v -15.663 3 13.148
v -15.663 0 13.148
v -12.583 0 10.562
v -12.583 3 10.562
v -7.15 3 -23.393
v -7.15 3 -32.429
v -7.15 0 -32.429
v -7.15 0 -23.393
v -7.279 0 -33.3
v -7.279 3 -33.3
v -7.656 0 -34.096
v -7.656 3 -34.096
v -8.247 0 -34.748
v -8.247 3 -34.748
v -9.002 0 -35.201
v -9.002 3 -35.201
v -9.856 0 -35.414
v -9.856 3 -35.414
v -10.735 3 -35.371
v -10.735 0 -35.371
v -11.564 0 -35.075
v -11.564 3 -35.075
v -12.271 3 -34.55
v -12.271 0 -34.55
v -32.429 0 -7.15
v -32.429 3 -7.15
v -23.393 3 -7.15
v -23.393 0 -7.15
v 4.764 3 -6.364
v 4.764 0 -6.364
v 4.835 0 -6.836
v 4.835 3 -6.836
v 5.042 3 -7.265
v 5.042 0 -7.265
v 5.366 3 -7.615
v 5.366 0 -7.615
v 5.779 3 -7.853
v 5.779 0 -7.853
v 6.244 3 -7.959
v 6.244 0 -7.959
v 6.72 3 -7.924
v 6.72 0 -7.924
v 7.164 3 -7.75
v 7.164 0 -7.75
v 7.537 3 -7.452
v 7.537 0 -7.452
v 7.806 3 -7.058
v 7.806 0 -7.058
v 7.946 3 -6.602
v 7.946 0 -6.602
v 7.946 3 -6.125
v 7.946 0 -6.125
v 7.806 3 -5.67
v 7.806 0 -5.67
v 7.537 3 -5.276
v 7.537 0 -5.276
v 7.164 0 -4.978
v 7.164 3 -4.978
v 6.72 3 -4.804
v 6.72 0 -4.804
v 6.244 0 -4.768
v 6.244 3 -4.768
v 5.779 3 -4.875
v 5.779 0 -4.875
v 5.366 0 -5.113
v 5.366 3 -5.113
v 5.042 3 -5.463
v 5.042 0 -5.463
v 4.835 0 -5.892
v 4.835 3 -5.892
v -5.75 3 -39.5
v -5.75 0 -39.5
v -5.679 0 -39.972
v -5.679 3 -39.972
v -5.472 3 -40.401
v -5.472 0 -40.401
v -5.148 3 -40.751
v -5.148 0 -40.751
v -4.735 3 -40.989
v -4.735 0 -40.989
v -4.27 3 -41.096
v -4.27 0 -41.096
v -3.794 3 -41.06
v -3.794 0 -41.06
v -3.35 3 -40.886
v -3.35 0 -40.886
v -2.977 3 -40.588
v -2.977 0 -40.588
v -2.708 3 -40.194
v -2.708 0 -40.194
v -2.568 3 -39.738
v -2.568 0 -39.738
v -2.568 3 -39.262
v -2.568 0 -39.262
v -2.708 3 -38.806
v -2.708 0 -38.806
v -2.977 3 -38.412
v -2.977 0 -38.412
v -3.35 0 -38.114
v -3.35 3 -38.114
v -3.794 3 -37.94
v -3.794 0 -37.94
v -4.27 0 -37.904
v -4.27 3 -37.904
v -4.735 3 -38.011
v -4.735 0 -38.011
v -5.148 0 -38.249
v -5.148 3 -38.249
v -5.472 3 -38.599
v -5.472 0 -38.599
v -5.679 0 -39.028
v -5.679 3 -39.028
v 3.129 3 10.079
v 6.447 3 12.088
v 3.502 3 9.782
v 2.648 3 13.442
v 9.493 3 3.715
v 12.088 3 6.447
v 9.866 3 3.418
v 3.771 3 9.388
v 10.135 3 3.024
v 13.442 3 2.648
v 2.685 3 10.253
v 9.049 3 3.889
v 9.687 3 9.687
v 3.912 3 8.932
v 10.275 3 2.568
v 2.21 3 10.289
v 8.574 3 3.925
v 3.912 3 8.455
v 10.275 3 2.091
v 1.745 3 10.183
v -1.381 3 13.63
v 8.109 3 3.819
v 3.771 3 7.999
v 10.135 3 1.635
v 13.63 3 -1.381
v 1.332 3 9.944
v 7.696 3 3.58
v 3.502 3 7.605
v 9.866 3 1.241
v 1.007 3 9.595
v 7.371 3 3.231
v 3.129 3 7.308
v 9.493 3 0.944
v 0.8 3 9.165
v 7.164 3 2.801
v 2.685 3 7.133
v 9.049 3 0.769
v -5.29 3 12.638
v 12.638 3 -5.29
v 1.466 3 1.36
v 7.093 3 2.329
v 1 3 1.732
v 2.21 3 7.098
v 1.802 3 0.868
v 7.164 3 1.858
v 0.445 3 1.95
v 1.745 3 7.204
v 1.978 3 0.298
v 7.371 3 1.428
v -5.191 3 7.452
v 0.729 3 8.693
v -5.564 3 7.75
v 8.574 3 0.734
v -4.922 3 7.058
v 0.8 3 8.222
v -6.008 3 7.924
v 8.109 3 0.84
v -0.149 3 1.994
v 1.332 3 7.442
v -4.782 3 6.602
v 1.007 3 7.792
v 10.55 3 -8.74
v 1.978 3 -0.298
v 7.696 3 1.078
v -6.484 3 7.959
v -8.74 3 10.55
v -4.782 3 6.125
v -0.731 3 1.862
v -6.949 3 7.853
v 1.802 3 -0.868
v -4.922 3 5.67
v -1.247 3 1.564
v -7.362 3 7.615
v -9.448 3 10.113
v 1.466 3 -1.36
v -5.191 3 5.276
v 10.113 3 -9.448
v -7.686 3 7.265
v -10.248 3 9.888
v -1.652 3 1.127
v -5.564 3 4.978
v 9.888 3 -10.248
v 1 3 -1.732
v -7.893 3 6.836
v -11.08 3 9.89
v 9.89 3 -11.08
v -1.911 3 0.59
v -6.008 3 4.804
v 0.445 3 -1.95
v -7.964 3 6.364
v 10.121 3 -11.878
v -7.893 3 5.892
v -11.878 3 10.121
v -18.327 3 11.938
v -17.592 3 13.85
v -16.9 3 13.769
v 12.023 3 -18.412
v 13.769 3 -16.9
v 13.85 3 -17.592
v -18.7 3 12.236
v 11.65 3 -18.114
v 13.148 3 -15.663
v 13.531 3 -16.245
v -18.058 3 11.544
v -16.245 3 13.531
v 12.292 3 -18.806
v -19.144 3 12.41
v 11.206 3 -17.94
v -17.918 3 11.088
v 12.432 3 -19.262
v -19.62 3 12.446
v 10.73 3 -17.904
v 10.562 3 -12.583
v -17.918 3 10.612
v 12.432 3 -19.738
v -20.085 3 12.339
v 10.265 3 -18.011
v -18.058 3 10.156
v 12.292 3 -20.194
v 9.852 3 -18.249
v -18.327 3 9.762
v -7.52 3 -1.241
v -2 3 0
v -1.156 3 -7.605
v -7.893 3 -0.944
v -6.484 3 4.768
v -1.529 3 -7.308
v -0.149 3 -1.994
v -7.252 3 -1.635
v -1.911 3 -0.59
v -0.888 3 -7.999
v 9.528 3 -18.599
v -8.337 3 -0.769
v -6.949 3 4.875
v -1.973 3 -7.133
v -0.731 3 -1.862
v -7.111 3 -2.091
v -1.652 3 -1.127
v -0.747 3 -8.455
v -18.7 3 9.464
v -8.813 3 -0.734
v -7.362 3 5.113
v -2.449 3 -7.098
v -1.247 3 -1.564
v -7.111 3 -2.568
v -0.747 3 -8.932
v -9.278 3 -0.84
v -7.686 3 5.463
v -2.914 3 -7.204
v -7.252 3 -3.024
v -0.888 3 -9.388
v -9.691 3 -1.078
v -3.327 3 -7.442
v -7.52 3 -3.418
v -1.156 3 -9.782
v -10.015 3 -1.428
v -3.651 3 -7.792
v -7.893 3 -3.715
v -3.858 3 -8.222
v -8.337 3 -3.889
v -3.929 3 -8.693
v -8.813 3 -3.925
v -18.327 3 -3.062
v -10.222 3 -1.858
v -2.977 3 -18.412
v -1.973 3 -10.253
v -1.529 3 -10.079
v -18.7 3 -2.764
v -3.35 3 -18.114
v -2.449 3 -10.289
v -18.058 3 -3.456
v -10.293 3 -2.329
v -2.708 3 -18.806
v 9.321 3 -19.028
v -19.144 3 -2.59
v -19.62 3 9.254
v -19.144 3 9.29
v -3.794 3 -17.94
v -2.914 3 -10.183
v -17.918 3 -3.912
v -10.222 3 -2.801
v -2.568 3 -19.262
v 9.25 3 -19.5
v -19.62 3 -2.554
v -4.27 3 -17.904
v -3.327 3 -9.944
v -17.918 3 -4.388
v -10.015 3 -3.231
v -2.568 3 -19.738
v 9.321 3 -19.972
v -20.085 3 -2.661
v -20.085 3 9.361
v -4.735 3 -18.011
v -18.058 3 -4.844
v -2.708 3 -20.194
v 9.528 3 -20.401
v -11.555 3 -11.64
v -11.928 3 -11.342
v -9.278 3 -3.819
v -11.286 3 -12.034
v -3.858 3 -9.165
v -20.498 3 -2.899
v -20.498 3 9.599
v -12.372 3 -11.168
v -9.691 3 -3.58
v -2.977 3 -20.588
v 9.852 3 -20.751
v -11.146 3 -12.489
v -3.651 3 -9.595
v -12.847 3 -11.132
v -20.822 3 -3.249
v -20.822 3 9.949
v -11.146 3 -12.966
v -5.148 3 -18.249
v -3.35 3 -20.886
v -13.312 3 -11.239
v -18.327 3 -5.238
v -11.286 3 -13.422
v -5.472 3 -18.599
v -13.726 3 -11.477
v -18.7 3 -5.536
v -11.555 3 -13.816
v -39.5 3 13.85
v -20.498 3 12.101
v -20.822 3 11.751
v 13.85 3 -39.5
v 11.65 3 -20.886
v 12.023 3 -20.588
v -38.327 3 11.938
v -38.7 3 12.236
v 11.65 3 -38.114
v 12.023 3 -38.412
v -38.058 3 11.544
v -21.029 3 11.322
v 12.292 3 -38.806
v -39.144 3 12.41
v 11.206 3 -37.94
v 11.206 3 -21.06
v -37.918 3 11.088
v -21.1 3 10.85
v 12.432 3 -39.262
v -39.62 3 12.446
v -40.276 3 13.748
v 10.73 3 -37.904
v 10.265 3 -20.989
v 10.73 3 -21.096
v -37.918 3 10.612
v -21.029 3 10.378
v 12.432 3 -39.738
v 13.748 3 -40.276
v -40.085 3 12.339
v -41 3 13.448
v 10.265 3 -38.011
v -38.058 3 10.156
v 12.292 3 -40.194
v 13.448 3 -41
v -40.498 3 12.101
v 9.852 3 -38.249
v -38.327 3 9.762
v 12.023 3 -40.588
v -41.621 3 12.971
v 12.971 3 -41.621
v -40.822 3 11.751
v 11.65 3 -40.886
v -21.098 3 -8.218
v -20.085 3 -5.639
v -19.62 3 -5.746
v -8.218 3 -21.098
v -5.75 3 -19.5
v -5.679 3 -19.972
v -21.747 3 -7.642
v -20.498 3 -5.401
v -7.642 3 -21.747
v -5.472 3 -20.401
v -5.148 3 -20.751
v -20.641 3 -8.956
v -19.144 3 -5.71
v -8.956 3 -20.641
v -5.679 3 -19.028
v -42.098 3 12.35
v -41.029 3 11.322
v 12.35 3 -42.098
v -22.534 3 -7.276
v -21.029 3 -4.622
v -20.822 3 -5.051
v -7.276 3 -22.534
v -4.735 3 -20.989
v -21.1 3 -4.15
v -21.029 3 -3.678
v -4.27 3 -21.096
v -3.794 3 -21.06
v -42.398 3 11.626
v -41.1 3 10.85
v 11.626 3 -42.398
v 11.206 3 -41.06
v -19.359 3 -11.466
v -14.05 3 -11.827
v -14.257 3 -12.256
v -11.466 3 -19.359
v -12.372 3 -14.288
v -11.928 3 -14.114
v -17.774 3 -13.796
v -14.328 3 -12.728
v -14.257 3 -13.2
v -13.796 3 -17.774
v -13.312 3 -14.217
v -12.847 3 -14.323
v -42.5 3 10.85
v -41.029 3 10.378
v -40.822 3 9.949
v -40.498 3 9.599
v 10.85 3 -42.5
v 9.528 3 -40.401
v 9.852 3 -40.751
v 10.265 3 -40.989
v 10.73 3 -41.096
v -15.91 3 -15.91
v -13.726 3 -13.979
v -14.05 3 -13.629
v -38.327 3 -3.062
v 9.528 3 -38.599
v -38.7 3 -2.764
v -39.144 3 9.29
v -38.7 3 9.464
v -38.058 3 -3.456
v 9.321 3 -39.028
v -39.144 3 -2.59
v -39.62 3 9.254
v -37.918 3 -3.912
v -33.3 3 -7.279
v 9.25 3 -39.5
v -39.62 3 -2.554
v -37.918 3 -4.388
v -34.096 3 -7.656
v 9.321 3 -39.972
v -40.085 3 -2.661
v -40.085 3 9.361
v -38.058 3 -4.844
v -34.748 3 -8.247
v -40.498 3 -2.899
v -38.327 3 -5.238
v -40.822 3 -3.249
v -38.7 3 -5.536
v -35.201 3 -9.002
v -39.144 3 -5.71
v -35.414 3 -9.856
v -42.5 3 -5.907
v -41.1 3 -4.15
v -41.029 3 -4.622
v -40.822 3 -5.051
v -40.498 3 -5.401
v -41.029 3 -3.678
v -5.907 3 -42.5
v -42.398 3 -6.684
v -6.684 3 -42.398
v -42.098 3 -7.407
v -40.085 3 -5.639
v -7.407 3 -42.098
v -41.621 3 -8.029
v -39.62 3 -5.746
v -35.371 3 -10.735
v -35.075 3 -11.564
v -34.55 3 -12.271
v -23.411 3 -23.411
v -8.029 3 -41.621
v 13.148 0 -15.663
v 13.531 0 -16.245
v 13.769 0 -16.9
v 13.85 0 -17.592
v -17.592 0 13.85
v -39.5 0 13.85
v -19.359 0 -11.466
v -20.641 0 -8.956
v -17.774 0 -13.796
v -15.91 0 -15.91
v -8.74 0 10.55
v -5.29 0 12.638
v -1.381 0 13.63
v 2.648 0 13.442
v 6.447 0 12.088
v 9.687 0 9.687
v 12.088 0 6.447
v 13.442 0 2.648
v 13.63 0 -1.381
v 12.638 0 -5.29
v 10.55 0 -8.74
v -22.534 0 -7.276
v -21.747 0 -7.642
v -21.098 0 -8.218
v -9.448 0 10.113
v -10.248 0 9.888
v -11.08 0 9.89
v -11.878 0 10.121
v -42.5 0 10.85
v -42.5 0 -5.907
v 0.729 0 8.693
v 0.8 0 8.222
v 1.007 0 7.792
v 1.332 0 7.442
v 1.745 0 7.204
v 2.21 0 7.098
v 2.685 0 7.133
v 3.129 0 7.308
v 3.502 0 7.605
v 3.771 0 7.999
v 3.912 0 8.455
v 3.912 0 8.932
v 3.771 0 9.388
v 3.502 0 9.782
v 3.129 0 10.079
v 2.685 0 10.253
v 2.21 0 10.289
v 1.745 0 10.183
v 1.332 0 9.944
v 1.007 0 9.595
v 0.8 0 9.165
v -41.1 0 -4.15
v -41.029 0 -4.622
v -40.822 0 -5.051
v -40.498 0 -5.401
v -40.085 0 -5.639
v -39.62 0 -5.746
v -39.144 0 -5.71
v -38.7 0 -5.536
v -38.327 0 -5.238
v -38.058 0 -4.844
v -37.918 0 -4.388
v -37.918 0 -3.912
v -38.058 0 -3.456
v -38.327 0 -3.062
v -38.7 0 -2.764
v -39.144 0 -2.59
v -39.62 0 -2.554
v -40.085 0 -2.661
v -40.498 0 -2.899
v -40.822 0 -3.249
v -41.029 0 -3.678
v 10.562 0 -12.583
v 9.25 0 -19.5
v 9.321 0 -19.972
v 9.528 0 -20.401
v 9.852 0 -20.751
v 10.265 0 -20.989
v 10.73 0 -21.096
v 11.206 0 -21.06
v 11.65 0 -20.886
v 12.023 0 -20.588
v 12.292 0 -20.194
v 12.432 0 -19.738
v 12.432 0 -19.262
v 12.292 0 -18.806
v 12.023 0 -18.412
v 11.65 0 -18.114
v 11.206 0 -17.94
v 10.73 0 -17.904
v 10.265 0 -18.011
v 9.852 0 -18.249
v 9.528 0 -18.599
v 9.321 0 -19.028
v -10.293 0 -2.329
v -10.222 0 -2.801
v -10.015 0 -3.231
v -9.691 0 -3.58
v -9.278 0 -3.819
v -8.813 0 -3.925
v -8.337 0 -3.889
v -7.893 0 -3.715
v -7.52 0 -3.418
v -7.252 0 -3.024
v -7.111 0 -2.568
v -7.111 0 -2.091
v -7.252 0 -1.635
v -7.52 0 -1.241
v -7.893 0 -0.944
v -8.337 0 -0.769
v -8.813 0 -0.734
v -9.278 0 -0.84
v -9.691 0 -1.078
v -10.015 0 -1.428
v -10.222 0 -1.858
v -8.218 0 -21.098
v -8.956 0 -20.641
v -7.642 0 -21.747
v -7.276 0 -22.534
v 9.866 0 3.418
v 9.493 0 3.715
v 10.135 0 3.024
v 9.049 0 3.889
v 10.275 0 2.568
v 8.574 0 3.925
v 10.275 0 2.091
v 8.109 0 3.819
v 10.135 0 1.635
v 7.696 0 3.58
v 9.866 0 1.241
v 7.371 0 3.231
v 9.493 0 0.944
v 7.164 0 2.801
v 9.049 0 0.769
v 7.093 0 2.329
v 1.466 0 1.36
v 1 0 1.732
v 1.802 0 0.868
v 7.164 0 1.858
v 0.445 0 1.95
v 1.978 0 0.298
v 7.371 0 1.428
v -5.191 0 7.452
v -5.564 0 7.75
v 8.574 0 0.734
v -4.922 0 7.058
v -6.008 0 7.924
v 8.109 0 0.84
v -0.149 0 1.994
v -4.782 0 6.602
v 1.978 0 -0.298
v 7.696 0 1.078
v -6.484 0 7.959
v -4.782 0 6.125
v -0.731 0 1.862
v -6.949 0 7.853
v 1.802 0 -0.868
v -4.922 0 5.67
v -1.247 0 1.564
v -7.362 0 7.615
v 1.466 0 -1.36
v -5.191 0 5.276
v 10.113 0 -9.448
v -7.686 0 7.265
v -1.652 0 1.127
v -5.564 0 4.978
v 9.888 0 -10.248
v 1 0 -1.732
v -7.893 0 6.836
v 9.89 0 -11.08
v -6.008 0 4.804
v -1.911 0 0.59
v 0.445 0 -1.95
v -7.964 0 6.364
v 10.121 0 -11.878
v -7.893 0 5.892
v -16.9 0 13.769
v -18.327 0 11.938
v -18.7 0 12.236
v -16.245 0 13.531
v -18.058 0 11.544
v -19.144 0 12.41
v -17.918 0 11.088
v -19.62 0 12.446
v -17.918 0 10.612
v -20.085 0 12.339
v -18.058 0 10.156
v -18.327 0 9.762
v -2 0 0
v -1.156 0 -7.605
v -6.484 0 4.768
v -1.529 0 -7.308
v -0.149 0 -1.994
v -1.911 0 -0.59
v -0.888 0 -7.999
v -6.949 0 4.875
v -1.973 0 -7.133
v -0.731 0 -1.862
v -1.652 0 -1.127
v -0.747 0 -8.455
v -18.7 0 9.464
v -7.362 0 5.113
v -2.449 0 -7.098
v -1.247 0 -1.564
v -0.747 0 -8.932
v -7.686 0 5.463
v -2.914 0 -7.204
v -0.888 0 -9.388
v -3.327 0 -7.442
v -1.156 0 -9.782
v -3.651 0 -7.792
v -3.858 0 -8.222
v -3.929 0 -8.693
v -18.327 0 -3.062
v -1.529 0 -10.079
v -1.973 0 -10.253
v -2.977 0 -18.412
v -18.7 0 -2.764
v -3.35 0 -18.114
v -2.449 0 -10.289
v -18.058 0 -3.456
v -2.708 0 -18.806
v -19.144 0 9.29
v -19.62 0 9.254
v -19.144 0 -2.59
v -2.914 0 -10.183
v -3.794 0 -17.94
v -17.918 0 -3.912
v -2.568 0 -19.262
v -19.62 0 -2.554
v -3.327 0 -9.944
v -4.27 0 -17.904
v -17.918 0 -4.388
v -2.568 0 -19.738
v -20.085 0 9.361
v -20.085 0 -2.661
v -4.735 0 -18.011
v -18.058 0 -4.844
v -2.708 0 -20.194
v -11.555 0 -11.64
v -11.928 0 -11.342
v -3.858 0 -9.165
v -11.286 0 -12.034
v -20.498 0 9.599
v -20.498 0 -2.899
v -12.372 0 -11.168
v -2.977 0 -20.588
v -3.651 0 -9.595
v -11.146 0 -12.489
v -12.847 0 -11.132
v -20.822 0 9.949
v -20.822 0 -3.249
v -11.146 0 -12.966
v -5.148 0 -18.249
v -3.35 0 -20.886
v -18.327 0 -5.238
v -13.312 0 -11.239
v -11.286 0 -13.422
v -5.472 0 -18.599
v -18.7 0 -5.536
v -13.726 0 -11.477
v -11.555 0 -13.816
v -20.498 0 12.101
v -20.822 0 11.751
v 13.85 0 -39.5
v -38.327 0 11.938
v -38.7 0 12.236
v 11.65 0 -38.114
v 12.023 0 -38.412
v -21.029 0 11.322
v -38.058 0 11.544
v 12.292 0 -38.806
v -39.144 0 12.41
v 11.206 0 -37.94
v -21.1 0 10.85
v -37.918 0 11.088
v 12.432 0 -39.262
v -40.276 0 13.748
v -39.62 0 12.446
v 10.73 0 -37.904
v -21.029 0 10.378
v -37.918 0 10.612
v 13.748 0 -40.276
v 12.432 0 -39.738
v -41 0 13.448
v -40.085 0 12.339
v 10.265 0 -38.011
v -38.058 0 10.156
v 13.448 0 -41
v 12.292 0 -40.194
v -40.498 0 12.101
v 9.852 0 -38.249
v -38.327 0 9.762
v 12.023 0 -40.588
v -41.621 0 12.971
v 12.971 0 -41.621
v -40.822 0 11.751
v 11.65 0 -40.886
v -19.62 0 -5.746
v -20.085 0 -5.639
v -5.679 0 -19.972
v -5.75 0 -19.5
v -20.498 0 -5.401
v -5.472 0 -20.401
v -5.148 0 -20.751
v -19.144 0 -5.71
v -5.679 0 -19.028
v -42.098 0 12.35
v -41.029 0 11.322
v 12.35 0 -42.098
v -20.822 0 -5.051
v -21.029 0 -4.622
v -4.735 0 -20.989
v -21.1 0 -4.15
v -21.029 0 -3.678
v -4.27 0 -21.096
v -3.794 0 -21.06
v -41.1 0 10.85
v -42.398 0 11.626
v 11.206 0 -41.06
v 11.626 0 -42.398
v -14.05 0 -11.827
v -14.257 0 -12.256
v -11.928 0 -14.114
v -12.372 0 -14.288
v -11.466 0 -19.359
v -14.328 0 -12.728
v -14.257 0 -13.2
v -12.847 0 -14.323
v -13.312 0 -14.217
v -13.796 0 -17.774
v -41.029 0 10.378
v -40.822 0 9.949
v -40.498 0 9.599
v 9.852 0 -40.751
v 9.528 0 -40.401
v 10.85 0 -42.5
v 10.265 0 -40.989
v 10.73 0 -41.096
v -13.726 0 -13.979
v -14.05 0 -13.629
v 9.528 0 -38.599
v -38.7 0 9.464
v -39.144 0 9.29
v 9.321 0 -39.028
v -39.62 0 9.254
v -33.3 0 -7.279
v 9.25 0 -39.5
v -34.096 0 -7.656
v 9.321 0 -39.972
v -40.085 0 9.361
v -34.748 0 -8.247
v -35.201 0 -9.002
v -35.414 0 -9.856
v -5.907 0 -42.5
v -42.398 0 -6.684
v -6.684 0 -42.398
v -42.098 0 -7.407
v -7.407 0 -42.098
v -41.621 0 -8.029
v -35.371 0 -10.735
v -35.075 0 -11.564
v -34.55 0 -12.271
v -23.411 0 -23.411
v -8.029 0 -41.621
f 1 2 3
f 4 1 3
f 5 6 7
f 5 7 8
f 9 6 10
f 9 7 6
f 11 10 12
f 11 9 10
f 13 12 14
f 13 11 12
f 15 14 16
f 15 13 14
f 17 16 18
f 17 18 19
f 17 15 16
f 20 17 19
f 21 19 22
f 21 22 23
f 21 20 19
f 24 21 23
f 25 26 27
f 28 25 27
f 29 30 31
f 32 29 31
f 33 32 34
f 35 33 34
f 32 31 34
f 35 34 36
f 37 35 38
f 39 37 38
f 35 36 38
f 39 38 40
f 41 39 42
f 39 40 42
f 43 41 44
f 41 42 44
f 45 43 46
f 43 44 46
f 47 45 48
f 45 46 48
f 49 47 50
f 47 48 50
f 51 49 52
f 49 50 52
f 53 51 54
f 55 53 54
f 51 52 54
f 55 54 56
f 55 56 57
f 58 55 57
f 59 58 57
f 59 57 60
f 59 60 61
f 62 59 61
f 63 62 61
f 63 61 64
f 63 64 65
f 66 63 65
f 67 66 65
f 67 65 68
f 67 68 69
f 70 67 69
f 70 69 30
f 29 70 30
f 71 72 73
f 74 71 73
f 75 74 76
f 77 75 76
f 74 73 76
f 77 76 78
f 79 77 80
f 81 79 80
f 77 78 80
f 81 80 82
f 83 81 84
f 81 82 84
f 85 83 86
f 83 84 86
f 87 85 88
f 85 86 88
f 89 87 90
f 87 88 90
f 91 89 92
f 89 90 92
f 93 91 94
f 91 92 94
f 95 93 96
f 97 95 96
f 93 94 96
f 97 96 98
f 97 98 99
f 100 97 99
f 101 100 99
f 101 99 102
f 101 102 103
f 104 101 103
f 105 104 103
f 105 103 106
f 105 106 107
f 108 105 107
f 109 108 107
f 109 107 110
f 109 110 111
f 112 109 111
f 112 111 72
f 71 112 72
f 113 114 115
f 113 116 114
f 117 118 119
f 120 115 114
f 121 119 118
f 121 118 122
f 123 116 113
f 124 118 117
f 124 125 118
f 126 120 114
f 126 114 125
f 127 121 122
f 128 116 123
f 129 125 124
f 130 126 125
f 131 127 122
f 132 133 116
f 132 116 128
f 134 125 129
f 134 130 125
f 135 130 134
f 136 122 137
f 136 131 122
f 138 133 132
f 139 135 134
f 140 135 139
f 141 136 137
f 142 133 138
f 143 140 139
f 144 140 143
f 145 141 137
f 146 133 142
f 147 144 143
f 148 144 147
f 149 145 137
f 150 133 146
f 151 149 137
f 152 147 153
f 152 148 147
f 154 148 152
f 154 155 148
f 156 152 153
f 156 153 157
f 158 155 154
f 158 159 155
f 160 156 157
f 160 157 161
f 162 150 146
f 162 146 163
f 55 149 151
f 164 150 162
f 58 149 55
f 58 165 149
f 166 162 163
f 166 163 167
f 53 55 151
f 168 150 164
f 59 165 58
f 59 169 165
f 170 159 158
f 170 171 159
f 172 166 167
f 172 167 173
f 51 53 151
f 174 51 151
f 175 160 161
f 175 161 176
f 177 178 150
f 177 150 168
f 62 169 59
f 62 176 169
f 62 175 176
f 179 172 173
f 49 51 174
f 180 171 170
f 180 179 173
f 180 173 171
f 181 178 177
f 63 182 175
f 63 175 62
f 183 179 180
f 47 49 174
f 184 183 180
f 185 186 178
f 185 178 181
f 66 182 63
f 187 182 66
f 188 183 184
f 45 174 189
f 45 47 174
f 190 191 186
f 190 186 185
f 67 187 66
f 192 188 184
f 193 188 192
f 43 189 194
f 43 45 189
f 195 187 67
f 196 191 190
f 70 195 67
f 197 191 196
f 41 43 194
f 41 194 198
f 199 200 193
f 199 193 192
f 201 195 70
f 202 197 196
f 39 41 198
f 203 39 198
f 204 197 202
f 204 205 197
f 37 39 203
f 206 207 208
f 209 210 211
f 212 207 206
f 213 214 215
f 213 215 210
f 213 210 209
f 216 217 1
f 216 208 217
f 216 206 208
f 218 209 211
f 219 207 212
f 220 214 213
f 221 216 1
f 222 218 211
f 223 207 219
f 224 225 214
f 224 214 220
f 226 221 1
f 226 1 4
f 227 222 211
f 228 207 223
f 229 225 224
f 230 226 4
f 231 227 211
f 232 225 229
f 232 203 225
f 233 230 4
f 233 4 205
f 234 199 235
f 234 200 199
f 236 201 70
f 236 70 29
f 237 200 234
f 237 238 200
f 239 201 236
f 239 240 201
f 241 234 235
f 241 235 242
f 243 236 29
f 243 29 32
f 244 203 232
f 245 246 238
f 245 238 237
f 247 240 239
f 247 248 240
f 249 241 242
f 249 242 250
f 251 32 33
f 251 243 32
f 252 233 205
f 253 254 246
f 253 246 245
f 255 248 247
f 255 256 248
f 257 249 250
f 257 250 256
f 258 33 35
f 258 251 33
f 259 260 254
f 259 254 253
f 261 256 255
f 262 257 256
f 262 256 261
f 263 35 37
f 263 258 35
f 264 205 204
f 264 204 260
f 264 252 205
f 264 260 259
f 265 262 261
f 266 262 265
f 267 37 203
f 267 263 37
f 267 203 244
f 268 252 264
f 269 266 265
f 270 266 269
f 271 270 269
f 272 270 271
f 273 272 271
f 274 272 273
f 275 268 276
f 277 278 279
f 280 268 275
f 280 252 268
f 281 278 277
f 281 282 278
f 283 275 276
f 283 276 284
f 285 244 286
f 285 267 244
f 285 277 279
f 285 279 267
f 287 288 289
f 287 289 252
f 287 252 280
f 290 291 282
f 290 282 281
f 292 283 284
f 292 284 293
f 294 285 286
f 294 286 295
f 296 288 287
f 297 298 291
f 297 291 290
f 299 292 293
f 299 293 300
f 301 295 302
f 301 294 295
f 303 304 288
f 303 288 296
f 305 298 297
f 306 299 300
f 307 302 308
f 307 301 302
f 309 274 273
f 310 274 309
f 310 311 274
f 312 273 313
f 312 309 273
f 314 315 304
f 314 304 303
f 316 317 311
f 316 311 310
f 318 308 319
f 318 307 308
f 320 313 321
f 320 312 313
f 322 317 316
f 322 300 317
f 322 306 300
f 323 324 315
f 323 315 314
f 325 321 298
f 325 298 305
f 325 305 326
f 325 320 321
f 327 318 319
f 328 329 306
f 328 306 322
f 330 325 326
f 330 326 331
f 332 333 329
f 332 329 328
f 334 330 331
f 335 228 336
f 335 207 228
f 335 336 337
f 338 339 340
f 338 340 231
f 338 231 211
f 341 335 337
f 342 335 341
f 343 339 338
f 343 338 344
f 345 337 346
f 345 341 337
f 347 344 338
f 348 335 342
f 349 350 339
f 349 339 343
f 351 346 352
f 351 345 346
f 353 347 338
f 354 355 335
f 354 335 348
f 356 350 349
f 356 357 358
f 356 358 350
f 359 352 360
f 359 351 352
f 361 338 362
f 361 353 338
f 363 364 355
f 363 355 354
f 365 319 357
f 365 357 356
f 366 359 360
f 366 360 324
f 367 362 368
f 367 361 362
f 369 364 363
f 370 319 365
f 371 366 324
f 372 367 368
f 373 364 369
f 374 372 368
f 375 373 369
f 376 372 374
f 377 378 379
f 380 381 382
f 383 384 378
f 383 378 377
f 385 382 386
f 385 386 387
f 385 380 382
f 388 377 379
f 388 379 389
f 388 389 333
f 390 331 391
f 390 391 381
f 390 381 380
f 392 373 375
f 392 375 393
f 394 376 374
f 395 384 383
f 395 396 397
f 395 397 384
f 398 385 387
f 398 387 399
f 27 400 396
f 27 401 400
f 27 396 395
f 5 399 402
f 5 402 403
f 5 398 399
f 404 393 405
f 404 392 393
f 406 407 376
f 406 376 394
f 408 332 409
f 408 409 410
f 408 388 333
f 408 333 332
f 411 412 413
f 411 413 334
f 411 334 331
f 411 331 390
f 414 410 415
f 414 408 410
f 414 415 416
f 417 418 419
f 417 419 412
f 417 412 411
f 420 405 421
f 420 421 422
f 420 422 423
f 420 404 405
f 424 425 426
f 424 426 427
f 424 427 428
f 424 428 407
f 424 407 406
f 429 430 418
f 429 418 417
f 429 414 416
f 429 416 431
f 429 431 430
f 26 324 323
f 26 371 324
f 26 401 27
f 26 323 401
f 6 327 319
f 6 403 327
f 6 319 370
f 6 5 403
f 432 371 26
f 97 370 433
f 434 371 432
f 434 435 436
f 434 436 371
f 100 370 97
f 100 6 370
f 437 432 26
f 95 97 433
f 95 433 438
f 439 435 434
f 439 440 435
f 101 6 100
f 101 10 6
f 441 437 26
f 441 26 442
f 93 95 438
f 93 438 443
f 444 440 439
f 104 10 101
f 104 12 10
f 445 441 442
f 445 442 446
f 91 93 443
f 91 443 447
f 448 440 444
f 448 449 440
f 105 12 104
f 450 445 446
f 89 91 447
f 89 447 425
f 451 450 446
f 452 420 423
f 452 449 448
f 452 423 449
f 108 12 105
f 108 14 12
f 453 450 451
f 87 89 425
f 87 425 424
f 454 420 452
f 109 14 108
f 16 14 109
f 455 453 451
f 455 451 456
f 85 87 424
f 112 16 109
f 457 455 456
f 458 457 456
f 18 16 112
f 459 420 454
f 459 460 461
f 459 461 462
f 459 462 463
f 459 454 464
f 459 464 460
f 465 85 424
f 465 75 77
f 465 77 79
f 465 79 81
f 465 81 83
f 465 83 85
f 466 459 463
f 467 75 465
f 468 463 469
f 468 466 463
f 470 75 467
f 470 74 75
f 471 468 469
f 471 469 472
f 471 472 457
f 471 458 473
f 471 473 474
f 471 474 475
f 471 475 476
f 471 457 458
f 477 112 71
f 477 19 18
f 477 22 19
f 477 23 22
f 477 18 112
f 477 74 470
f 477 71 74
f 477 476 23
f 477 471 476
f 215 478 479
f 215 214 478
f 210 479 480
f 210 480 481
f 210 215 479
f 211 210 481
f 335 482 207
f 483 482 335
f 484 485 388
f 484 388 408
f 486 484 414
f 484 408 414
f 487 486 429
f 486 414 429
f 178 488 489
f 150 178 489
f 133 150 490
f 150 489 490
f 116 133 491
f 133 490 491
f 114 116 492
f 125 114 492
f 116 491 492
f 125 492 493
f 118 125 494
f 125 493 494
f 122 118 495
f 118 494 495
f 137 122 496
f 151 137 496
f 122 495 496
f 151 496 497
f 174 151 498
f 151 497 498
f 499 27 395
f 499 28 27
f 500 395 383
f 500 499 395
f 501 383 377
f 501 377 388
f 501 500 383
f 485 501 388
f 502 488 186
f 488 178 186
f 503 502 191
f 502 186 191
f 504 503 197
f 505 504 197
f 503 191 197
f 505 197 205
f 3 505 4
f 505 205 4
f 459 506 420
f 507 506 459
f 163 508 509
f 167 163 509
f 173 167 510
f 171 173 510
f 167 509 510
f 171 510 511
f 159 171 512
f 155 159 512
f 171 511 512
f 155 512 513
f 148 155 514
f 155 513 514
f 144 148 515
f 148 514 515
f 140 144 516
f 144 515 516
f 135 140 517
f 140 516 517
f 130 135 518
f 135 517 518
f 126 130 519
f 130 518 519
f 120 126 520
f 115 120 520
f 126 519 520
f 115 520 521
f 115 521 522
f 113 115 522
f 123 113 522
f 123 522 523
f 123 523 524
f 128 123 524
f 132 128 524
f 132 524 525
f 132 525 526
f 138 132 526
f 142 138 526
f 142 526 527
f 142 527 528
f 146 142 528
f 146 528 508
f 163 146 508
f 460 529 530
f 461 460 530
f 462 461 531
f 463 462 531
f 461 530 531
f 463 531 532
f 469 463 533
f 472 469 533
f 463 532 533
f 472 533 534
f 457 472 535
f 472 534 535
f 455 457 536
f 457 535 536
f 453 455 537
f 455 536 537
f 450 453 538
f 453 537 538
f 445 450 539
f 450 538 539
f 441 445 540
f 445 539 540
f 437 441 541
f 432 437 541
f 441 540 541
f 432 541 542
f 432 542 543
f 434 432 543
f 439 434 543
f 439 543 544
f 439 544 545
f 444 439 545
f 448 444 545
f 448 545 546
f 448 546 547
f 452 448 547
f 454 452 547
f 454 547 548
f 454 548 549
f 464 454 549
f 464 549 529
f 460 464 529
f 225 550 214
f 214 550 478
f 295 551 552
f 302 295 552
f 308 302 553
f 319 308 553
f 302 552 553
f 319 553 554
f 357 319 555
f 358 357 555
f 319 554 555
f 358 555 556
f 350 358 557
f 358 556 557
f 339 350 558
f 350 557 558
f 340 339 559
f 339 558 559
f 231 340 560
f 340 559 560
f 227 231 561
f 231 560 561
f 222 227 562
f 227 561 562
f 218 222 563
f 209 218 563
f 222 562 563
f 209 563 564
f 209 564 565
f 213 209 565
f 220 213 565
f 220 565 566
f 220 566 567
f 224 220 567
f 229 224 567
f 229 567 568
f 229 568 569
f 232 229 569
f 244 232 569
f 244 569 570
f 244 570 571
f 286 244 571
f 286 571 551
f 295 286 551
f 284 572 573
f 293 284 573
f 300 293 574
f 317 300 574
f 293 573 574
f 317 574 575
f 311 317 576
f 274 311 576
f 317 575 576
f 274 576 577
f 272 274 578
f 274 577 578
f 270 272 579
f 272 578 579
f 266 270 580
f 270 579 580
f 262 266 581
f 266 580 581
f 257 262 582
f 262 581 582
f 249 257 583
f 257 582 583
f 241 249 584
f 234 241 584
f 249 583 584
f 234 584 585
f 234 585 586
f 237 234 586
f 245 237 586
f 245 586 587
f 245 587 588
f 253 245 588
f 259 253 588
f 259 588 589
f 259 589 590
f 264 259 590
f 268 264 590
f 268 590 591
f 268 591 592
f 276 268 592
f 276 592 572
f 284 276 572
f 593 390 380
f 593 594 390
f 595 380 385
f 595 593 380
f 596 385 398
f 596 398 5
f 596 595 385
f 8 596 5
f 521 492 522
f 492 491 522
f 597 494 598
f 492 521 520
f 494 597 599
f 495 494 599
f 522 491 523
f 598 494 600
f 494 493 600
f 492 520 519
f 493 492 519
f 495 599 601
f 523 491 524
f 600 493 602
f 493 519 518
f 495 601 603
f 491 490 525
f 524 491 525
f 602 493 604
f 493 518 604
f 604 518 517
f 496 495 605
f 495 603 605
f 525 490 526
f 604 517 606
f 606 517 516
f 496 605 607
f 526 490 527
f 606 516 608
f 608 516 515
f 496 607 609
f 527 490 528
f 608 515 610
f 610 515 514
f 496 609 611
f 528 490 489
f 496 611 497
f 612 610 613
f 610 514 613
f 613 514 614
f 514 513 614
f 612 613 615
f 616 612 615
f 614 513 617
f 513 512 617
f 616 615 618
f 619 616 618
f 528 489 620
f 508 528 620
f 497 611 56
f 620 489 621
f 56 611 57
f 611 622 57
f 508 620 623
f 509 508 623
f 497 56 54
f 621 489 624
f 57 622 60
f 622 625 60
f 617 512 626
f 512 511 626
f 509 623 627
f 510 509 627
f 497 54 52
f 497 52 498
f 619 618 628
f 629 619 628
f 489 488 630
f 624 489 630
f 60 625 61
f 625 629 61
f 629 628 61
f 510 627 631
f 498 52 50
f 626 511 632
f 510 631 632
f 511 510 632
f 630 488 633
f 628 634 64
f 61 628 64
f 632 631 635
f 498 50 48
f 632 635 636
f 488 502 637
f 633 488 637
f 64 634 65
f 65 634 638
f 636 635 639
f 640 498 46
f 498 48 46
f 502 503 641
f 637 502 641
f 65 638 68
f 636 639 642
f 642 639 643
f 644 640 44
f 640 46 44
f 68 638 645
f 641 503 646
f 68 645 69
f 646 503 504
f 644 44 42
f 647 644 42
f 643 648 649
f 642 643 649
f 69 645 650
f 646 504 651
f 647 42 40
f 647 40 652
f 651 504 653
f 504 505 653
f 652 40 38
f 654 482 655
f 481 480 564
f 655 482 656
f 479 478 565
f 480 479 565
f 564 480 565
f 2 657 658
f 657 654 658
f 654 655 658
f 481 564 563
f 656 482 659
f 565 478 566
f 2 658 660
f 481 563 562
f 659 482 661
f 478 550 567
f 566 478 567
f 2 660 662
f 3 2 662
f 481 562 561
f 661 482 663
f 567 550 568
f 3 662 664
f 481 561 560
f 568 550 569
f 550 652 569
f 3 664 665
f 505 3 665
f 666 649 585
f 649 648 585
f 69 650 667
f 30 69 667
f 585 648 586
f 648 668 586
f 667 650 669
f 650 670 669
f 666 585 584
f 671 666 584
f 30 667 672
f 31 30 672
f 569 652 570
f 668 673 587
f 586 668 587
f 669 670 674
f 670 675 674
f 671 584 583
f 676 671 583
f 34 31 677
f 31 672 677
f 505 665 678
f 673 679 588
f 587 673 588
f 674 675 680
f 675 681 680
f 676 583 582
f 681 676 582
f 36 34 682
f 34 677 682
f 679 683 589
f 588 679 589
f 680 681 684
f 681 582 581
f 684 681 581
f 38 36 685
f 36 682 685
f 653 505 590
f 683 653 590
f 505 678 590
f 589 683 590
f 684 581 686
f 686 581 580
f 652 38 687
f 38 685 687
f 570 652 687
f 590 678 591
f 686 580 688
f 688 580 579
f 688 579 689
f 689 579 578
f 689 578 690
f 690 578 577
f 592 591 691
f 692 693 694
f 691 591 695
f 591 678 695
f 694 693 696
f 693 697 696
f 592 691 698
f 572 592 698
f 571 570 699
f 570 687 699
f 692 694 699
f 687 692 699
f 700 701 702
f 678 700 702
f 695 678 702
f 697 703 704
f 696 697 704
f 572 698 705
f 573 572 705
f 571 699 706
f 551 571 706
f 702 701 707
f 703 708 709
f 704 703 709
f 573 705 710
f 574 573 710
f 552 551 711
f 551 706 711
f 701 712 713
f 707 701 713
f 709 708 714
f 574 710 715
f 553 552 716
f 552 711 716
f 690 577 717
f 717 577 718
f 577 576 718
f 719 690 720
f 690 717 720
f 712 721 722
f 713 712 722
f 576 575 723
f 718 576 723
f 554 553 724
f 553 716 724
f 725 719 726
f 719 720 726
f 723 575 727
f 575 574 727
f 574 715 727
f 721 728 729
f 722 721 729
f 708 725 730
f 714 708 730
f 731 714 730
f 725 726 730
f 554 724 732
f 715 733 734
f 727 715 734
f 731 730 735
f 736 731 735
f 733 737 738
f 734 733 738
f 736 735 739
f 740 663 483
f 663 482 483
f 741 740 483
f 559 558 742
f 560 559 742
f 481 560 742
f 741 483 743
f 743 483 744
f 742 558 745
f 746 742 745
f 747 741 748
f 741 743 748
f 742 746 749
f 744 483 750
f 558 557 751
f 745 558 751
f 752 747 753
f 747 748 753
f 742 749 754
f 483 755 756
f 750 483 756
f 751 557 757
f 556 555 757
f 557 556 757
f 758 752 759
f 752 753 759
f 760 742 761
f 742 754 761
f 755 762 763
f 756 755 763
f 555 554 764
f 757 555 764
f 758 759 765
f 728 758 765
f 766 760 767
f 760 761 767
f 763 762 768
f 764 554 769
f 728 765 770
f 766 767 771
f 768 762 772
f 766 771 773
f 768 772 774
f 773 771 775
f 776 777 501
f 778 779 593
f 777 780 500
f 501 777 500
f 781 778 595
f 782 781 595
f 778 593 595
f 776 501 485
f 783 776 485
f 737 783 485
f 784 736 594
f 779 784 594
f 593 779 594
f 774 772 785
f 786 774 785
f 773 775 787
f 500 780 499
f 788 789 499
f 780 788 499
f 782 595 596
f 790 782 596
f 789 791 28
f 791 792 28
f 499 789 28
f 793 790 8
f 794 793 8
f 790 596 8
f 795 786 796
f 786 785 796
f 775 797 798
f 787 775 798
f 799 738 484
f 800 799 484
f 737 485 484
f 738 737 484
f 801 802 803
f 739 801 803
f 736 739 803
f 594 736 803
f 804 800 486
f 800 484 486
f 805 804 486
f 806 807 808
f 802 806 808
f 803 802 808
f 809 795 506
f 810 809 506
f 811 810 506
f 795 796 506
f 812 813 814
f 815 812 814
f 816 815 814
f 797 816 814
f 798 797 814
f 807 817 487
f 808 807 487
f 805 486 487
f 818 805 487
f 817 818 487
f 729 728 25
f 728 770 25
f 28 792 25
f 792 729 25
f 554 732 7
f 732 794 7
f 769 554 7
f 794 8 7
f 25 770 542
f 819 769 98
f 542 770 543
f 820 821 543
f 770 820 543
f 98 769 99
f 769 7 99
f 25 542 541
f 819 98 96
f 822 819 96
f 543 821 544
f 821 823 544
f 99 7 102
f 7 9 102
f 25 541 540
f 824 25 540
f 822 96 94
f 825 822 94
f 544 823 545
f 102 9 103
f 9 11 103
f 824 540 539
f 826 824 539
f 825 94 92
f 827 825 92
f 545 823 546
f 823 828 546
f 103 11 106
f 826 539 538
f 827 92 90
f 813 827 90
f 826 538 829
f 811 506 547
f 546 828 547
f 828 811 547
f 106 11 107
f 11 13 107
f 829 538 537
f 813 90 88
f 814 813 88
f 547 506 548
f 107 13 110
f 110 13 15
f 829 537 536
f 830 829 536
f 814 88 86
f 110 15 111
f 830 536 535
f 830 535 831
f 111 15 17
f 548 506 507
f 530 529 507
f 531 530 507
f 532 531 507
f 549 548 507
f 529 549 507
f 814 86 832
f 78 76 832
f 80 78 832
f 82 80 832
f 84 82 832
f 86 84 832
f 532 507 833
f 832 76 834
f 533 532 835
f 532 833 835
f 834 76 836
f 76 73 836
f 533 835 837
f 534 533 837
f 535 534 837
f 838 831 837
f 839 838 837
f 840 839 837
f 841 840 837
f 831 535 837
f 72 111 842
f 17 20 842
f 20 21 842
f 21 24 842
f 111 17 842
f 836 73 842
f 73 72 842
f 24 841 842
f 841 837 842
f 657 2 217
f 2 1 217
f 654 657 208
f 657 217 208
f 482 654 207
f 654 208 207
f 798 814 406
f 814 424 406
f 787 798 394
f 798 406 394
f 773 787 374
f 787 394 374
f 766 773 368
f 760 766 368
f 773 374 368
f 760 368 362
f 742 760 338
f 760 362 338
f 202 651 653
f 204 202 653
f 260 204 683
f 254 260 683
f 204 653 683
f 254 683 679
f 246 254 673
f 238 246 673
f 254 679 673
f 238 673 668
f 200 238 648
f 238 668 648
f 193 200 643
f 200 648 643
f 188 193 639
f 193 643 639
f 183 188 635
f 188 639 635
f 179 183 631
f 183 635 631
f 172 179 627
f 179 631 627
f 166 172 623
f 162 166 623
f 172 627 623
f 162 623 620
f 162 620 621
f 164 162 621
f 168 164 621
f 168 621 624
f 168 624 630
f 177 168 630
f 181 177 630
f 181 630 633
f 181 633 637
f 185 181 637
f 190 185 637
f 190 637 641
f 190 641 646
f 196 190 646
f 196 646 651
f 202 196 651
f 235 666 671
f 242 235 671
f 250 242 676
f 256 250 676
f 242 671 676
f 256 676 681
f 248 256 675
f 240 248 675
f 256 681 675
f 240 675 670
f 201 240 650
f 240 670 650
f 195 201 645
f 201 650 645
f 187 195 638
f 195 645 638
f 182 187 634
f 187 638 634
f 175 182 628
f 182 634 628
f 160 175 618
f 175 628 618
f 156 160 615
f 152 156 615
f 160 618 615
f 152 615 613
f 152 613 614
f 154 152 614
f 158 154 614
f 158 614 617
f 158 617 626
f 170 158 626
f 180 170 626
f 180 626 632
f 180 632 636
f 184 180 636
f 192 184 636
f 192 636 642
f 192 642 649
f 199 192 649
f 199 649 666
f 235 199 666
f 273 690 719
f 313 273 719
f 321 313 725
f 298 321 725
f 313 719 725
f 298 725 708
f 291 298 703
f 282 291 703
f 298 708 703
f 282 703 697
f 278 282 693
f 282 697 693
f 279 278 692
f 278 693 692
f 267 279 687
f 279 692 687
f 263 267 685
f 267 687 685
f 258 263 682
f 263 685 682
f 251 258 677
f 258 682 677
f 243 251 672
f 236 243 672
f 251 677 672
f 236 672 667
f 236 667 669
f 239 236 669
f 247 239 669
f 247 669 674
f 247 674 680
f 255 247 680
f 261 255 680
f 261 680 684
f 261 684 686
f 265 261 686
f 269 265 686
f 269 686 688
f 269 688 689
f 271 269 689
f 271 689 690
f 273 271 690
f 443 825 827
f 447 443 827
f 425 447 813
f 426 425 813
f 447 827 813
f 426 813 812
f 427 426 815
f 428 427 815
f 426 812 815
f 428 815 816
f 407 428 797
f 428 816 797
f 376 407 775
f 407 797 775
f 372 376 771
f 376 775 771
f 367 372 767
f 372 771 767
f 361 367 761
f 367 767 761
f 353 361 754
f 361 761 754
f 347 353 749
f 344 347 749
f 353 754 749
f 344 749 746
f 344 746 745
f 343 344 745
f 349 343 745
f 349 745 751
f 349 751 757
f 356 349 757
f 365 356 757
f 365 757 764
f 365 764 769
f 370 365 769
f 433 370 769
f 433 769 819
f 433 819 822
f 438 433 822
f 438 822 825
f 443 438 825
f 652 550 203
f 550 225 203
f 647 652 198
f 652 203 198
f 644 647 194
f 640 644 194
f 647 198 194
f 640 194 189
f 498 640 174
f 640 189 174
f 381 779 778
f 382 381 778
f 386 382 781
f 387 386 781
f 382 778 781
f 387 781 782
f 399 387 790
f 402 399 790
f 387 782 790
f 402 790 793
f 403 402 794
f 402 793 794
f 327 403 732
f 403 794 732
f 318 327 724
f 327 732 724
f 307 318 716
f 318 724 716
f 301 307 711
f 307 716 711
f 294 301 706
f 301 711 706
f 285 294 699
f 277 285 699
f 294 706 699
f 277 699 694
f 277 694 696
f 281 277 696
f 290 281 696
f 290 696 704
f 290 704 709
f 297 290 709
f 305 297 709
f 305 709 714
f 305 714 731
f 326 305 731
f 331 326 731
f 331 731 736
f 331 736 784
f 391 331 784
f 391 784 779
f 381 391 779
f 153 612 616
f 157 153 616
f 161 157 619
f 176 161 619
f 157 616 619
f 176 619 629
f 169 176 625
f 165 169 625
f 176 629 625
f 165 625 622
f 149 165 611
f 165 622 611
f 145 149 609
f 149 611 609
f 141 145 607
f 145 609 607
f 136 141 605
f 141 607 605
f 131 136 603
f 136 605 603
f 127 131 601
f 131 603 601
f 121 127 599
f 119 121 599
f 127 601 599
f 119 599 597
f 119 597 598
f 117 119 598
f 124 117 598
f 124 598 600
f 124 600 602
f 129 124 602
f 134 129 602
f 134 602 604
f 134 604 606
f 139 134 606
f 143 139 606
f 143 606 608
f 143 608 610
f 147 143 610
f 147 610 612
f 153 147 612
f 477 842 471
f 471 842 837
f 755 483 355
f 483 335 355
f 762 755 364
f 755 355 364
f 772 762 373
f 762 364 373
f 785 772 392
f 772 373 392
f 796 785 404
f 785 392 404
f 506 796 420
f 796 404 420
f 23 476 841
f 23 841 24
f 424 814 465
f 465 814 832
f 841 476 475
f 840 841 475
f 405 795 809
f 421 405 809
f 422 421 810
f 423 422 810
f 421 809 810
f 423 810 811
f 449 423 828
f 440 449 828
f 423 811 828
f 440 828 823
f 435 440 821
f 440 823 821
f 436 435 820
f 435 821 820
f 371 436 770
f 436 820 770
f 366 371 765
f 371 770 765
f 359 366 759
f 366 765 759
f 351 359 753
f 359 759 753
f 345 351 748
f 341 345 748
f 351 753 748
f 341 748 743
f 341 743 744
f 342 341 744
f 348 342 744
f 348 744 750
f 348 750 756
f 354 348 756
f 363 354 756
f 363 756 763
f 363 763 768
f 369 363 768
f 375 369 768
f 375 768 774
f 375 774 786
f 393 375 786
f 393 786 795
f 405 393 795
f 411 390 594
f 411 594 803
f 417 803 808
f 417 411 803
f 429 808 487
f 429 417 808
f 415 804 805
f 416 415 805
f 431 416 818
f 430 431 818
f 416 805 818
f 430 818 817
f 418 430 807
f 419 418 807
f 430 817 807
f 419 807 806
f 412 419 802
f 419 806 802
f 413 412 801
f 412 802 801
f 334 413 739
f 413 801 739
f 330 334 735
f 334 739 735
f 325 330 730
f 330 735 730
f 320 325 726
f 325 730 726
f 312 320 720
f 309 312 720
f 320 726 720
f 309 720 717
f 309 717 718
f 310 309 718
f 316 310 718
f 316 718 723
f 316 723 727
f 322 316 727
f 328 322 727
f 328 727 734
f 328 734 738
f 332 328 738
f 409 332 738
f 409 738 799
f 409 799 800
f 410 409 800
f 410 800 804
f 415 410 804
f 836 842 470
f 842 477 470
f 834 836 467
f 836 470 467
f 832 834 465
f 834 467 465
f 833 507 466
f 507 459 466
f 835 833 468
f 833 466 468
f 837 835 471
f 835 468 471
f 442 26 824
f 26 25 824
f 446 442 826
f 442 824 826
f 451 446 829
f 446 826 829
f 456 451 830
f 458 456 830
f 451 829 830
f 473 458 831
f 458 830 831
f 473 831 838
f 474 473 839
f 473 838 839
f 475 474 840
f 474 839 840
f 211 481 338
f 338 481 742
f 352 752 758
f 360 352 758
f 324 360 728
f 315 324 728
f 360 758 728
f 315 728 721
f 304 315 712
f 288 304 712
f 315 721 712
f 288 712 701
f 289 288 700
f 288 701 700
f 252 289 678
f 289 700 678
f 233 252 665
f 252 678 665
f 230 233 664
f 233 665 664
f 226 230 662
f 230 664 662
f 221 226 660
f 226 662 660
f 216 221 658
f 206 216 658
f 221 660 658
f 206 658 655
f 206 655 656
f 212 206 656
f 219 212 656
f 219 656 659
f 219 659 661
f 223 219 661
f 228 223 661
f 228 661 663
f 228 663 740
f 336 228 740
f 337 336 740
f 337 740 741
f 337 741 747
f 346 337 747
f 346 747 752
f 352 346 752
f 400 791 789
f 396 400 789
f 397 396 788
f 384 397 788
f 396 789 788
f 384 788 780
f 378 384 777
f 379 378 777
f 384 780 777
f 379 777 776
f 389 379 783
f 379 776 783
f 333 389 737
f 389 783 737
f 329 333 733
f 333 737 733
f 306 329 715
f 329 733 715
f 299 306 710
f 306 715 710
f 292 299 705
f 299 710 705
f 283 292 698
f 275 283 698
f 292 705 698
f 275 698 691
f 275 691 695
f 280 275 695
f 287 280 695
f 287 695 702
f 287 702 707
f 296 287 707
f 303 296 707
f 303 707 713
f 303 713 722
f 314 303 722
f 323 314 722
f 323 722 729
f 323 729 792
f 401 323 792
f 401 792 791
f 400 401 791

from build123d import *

# Parameters (mm, degrees)
BOSS_EXTRUDE1_DEPTH      = 3
M3_CLEARANCE_HOLE1_D     = 3.2
M3_CLEARANCE_HOLE2_D     = 3.2
F_4_0_4_DIAMETER_HOLE1_D = 4
CUT_EXTRUDE3_DEPTH       = 3
FILLET5_R                = 3
M3_CLEARANCE_HOLE3_D     = 3.2
CUT_EXTRUDE4_START       = -3
CUT_EXTRUDE4_DEPTH       = 3
FILLET6_R                = 3


with BuildPart() as part:
    # Sketch2 → Boss-Extrude1 (new body)
    with BuildSketch(Plane(origin=(0, 0, 0), x_dir=(1, 0, 0), z_dir=(0, 1, 0))):
        with BuildLine():
            Line((-16.5, -13.85), (-42.5, -13.85))
            Line((-42.5, -13.85), (-42.5, 7.15))
            Line((-42.5, 7.15), (-24.825, 24.825))
            Line((-24.825, 24.825), (25.724873734, -25.724873734))
            Line((25.724873734, -25.724873734), (16.974873734, -34.474873734))
            ThreePointArc((16.974873734, -34.474873734), (14.482141695, -35.49995444), (12, -34.449489743))
            Line((12, -34.449489743), (12, -39))
            Line((12, -39), (-12, -39))
            Line((-12, -39), (-12, -34.449489743))
            ThreePointArc((-12, -34.449489743), (-17.17260394, -34.259908888), (-16.5, -29.127718677))
            Line((-16.5, -29.127718677), (-16.5, -13.85))
        make_face()
    extrude(amount=BOSS_EXTRUDE1_DEPTH)

    # Mirror5: part across plane


with BuildPart() as part_1:
    add(part.part)
    add(part.part.mirror(Plane(origin=(25.724873734, 3, 25.724873734), x_dir=(0.7071067811865465, 0, 0.7071067811865487), z_dir=(-0.7071067811865486, 0, 0.7071067811865465))))

    # M3 Clearance Hole1 (through all)
    with Locations(Plane(origin=(0, 3, 0), x_dir=(1, 0, 0), z_dir=(0, 1, 0))):
        with Locations((-39.5, 4.15), (-19.5, 4.15), (-19.5, -10.85), (-39.5, -10.85), (-4.15, 19.5), (-4.15, 39.5), (10.85, 39.5), (10.85, 19.5)):
            Hole(M3_CLEARANCE_HOLE1_D / 2)

    # M3 Clearance Hole2 (through all)
    with Locations(Plane(origin=(0, 3, 0), x_dir=(1, 0, 0), z_dir=(0, 1, 0))):
        with Locations((-2.329371406, 8.693332437), (6.363961031, 6.363961031), (8.693332437, -2.329371406), (2.329371406, -8.693332437), (-6.363961031, -6.363961031), (-8.693332437, 2.329371406)):
            Hole(M3_CLEARANCE_HOLE2_D / 2)

    # Ø4.0 (4) Diameter Hole1 (through all)
    with Locations(Plane(origin=(0, 3, 0), x_dir=(1, 0, 0), z_dir=(0, 1, 0))):
        with Locations((0, 0)):
            Hole(F_4_0_4_DIAMETER_HOLE1_D / 2)

    # Sketch13 → Cut-Extrude3 (cut)
    with BuildSketch(Plane(origin=(0, 3, 0), x_dir=(1, 0, 0), z_dir=(0, 1, 0))):
        with BuildLine():
            Line((-39.671572875, 7.15), (-21.333717444, 7.15))
            ThreePointArc((-21.333717444, 7.15), (-19.129970762, 11.844586048), (-15.909902577, 15.909902577))
            Line((-15.909902577, 15.909902577), (-23.410786438, 23.410786438))
            Line((-23.410786438, 23.410786438), (-39.671572875, 7.15))
        make_face()
    cut_extrude3 = extrude(amount=-CUT_EXTRUDE3_DEPTH, mode=Mode.SUBTRACT)

    # Mirror6: Cut-Extrude3 across plane
    add(cut_extrude3.mirror(Plane(origin=(0, -28.792883686, 0), x_dir=(0.7071067811865467, 0, 0.7071067811865482), z_dir=(-0.7071067811865482, 0, 0.7071067811865468))), mode=Mode.SUBTRACT)

    # Fillet5
    fillet5_edges = [part_1.edges().sort_by_distance(p)[0] for p in [
        (-21.333717444, 1.5, -7.15),
        (-39.671572875, 1.5, -7.15),
        (-7.15, 1.5, -21.333717444),
        (-7.15, 1.5, -39.671572875),
    ]]
    fillet(fillet5_edges, radius=FILLET5_R)

    # M3 Clearance Hole3 (through all)
    with Locations(Plane(origin=(0, 3, 0), x_dir=(1, 0, 0), z_dir=(0, 1, 0))):
        with Locations((-12.727922061, 12.727922061)):
            Hole(M3_CLEARANCE_HOLE3_D / 2)

    # Sketch16 → Cut-Extrude4 (cut)
    with BuildSketch(Plane(origin=(0, 3, 0), x_dir=(1, 0, 0), z_dir=(0, 1, 0)).offset(CUT_EXTRUDE4_START)):
        with BuildLine():
            Line((-16.5, -13.85), (-10.493288043, -8.808002387))
            ThreePointArc((-10.493288043, -8.808002387), (9.687362902, -9.687362902), (8.808002387, 10.493288043))
            Line((8.808002387, 10.493288043), (13.85, 16.5))
            Line((13.85, 16.5), (29.127718677, 16.5))
            ThreePointArc((29.127718677, 16.5), (34.259908888, 17.17260394), (34.449489743, 12))
            Line((34.449489743, 12), (39, 12))
            Line((39, 12), (39, -12))
            Line((39, -12), (34.449489743, -12))
            ThreePointArc((34.449489743, -12), (35.49995444, -14.482141695), (34.474873734, -16.974873734))
            Line((34.474873734, -16.974873734), (16.974873734, -34.474873734))
            ThreePointArc((16.974873734, -34.474873734), (14.482141695, -35.49995444), (12, -34.449489743))
            Line((12, -34.449489743), (12, -39))
            Line((12, -39), (-12, -39))
            Line((-12, -39), (-12, -34.449489743))
            ThreePointArc((-12, -34.449489743), (-17.17260394, -34.259908888), (-16.5, -29.127718677))
            Line((-16.5, -29.127718677), (-16.5, -13.85))
        make_face()
    extrude(amount=CUT_EXTRUDE4_DEPTH, mode=Mode.SUBTRACT)

    # Fillet6
    fillet6_edges = [part_1.edges().sort_by_distance(p)[0] for p in [
        (-16.5, 1.5, 13.85),
        (-42.5, 1.5, 13.85),
        (-42.5, 1.5, -7.15),
        (-10.493288043, 1.5, 8.808002387),
        (8.808002387, 1.5, -10.493288043),
        (-7.15, 1.5, -42.5),
        (13.85, 1.5, -42.5),
        (13.85, 1.5, -16.5),
    ]]
    fillet(fillet6_edges, radius=FILLET6_R)


solid = part_1.part
